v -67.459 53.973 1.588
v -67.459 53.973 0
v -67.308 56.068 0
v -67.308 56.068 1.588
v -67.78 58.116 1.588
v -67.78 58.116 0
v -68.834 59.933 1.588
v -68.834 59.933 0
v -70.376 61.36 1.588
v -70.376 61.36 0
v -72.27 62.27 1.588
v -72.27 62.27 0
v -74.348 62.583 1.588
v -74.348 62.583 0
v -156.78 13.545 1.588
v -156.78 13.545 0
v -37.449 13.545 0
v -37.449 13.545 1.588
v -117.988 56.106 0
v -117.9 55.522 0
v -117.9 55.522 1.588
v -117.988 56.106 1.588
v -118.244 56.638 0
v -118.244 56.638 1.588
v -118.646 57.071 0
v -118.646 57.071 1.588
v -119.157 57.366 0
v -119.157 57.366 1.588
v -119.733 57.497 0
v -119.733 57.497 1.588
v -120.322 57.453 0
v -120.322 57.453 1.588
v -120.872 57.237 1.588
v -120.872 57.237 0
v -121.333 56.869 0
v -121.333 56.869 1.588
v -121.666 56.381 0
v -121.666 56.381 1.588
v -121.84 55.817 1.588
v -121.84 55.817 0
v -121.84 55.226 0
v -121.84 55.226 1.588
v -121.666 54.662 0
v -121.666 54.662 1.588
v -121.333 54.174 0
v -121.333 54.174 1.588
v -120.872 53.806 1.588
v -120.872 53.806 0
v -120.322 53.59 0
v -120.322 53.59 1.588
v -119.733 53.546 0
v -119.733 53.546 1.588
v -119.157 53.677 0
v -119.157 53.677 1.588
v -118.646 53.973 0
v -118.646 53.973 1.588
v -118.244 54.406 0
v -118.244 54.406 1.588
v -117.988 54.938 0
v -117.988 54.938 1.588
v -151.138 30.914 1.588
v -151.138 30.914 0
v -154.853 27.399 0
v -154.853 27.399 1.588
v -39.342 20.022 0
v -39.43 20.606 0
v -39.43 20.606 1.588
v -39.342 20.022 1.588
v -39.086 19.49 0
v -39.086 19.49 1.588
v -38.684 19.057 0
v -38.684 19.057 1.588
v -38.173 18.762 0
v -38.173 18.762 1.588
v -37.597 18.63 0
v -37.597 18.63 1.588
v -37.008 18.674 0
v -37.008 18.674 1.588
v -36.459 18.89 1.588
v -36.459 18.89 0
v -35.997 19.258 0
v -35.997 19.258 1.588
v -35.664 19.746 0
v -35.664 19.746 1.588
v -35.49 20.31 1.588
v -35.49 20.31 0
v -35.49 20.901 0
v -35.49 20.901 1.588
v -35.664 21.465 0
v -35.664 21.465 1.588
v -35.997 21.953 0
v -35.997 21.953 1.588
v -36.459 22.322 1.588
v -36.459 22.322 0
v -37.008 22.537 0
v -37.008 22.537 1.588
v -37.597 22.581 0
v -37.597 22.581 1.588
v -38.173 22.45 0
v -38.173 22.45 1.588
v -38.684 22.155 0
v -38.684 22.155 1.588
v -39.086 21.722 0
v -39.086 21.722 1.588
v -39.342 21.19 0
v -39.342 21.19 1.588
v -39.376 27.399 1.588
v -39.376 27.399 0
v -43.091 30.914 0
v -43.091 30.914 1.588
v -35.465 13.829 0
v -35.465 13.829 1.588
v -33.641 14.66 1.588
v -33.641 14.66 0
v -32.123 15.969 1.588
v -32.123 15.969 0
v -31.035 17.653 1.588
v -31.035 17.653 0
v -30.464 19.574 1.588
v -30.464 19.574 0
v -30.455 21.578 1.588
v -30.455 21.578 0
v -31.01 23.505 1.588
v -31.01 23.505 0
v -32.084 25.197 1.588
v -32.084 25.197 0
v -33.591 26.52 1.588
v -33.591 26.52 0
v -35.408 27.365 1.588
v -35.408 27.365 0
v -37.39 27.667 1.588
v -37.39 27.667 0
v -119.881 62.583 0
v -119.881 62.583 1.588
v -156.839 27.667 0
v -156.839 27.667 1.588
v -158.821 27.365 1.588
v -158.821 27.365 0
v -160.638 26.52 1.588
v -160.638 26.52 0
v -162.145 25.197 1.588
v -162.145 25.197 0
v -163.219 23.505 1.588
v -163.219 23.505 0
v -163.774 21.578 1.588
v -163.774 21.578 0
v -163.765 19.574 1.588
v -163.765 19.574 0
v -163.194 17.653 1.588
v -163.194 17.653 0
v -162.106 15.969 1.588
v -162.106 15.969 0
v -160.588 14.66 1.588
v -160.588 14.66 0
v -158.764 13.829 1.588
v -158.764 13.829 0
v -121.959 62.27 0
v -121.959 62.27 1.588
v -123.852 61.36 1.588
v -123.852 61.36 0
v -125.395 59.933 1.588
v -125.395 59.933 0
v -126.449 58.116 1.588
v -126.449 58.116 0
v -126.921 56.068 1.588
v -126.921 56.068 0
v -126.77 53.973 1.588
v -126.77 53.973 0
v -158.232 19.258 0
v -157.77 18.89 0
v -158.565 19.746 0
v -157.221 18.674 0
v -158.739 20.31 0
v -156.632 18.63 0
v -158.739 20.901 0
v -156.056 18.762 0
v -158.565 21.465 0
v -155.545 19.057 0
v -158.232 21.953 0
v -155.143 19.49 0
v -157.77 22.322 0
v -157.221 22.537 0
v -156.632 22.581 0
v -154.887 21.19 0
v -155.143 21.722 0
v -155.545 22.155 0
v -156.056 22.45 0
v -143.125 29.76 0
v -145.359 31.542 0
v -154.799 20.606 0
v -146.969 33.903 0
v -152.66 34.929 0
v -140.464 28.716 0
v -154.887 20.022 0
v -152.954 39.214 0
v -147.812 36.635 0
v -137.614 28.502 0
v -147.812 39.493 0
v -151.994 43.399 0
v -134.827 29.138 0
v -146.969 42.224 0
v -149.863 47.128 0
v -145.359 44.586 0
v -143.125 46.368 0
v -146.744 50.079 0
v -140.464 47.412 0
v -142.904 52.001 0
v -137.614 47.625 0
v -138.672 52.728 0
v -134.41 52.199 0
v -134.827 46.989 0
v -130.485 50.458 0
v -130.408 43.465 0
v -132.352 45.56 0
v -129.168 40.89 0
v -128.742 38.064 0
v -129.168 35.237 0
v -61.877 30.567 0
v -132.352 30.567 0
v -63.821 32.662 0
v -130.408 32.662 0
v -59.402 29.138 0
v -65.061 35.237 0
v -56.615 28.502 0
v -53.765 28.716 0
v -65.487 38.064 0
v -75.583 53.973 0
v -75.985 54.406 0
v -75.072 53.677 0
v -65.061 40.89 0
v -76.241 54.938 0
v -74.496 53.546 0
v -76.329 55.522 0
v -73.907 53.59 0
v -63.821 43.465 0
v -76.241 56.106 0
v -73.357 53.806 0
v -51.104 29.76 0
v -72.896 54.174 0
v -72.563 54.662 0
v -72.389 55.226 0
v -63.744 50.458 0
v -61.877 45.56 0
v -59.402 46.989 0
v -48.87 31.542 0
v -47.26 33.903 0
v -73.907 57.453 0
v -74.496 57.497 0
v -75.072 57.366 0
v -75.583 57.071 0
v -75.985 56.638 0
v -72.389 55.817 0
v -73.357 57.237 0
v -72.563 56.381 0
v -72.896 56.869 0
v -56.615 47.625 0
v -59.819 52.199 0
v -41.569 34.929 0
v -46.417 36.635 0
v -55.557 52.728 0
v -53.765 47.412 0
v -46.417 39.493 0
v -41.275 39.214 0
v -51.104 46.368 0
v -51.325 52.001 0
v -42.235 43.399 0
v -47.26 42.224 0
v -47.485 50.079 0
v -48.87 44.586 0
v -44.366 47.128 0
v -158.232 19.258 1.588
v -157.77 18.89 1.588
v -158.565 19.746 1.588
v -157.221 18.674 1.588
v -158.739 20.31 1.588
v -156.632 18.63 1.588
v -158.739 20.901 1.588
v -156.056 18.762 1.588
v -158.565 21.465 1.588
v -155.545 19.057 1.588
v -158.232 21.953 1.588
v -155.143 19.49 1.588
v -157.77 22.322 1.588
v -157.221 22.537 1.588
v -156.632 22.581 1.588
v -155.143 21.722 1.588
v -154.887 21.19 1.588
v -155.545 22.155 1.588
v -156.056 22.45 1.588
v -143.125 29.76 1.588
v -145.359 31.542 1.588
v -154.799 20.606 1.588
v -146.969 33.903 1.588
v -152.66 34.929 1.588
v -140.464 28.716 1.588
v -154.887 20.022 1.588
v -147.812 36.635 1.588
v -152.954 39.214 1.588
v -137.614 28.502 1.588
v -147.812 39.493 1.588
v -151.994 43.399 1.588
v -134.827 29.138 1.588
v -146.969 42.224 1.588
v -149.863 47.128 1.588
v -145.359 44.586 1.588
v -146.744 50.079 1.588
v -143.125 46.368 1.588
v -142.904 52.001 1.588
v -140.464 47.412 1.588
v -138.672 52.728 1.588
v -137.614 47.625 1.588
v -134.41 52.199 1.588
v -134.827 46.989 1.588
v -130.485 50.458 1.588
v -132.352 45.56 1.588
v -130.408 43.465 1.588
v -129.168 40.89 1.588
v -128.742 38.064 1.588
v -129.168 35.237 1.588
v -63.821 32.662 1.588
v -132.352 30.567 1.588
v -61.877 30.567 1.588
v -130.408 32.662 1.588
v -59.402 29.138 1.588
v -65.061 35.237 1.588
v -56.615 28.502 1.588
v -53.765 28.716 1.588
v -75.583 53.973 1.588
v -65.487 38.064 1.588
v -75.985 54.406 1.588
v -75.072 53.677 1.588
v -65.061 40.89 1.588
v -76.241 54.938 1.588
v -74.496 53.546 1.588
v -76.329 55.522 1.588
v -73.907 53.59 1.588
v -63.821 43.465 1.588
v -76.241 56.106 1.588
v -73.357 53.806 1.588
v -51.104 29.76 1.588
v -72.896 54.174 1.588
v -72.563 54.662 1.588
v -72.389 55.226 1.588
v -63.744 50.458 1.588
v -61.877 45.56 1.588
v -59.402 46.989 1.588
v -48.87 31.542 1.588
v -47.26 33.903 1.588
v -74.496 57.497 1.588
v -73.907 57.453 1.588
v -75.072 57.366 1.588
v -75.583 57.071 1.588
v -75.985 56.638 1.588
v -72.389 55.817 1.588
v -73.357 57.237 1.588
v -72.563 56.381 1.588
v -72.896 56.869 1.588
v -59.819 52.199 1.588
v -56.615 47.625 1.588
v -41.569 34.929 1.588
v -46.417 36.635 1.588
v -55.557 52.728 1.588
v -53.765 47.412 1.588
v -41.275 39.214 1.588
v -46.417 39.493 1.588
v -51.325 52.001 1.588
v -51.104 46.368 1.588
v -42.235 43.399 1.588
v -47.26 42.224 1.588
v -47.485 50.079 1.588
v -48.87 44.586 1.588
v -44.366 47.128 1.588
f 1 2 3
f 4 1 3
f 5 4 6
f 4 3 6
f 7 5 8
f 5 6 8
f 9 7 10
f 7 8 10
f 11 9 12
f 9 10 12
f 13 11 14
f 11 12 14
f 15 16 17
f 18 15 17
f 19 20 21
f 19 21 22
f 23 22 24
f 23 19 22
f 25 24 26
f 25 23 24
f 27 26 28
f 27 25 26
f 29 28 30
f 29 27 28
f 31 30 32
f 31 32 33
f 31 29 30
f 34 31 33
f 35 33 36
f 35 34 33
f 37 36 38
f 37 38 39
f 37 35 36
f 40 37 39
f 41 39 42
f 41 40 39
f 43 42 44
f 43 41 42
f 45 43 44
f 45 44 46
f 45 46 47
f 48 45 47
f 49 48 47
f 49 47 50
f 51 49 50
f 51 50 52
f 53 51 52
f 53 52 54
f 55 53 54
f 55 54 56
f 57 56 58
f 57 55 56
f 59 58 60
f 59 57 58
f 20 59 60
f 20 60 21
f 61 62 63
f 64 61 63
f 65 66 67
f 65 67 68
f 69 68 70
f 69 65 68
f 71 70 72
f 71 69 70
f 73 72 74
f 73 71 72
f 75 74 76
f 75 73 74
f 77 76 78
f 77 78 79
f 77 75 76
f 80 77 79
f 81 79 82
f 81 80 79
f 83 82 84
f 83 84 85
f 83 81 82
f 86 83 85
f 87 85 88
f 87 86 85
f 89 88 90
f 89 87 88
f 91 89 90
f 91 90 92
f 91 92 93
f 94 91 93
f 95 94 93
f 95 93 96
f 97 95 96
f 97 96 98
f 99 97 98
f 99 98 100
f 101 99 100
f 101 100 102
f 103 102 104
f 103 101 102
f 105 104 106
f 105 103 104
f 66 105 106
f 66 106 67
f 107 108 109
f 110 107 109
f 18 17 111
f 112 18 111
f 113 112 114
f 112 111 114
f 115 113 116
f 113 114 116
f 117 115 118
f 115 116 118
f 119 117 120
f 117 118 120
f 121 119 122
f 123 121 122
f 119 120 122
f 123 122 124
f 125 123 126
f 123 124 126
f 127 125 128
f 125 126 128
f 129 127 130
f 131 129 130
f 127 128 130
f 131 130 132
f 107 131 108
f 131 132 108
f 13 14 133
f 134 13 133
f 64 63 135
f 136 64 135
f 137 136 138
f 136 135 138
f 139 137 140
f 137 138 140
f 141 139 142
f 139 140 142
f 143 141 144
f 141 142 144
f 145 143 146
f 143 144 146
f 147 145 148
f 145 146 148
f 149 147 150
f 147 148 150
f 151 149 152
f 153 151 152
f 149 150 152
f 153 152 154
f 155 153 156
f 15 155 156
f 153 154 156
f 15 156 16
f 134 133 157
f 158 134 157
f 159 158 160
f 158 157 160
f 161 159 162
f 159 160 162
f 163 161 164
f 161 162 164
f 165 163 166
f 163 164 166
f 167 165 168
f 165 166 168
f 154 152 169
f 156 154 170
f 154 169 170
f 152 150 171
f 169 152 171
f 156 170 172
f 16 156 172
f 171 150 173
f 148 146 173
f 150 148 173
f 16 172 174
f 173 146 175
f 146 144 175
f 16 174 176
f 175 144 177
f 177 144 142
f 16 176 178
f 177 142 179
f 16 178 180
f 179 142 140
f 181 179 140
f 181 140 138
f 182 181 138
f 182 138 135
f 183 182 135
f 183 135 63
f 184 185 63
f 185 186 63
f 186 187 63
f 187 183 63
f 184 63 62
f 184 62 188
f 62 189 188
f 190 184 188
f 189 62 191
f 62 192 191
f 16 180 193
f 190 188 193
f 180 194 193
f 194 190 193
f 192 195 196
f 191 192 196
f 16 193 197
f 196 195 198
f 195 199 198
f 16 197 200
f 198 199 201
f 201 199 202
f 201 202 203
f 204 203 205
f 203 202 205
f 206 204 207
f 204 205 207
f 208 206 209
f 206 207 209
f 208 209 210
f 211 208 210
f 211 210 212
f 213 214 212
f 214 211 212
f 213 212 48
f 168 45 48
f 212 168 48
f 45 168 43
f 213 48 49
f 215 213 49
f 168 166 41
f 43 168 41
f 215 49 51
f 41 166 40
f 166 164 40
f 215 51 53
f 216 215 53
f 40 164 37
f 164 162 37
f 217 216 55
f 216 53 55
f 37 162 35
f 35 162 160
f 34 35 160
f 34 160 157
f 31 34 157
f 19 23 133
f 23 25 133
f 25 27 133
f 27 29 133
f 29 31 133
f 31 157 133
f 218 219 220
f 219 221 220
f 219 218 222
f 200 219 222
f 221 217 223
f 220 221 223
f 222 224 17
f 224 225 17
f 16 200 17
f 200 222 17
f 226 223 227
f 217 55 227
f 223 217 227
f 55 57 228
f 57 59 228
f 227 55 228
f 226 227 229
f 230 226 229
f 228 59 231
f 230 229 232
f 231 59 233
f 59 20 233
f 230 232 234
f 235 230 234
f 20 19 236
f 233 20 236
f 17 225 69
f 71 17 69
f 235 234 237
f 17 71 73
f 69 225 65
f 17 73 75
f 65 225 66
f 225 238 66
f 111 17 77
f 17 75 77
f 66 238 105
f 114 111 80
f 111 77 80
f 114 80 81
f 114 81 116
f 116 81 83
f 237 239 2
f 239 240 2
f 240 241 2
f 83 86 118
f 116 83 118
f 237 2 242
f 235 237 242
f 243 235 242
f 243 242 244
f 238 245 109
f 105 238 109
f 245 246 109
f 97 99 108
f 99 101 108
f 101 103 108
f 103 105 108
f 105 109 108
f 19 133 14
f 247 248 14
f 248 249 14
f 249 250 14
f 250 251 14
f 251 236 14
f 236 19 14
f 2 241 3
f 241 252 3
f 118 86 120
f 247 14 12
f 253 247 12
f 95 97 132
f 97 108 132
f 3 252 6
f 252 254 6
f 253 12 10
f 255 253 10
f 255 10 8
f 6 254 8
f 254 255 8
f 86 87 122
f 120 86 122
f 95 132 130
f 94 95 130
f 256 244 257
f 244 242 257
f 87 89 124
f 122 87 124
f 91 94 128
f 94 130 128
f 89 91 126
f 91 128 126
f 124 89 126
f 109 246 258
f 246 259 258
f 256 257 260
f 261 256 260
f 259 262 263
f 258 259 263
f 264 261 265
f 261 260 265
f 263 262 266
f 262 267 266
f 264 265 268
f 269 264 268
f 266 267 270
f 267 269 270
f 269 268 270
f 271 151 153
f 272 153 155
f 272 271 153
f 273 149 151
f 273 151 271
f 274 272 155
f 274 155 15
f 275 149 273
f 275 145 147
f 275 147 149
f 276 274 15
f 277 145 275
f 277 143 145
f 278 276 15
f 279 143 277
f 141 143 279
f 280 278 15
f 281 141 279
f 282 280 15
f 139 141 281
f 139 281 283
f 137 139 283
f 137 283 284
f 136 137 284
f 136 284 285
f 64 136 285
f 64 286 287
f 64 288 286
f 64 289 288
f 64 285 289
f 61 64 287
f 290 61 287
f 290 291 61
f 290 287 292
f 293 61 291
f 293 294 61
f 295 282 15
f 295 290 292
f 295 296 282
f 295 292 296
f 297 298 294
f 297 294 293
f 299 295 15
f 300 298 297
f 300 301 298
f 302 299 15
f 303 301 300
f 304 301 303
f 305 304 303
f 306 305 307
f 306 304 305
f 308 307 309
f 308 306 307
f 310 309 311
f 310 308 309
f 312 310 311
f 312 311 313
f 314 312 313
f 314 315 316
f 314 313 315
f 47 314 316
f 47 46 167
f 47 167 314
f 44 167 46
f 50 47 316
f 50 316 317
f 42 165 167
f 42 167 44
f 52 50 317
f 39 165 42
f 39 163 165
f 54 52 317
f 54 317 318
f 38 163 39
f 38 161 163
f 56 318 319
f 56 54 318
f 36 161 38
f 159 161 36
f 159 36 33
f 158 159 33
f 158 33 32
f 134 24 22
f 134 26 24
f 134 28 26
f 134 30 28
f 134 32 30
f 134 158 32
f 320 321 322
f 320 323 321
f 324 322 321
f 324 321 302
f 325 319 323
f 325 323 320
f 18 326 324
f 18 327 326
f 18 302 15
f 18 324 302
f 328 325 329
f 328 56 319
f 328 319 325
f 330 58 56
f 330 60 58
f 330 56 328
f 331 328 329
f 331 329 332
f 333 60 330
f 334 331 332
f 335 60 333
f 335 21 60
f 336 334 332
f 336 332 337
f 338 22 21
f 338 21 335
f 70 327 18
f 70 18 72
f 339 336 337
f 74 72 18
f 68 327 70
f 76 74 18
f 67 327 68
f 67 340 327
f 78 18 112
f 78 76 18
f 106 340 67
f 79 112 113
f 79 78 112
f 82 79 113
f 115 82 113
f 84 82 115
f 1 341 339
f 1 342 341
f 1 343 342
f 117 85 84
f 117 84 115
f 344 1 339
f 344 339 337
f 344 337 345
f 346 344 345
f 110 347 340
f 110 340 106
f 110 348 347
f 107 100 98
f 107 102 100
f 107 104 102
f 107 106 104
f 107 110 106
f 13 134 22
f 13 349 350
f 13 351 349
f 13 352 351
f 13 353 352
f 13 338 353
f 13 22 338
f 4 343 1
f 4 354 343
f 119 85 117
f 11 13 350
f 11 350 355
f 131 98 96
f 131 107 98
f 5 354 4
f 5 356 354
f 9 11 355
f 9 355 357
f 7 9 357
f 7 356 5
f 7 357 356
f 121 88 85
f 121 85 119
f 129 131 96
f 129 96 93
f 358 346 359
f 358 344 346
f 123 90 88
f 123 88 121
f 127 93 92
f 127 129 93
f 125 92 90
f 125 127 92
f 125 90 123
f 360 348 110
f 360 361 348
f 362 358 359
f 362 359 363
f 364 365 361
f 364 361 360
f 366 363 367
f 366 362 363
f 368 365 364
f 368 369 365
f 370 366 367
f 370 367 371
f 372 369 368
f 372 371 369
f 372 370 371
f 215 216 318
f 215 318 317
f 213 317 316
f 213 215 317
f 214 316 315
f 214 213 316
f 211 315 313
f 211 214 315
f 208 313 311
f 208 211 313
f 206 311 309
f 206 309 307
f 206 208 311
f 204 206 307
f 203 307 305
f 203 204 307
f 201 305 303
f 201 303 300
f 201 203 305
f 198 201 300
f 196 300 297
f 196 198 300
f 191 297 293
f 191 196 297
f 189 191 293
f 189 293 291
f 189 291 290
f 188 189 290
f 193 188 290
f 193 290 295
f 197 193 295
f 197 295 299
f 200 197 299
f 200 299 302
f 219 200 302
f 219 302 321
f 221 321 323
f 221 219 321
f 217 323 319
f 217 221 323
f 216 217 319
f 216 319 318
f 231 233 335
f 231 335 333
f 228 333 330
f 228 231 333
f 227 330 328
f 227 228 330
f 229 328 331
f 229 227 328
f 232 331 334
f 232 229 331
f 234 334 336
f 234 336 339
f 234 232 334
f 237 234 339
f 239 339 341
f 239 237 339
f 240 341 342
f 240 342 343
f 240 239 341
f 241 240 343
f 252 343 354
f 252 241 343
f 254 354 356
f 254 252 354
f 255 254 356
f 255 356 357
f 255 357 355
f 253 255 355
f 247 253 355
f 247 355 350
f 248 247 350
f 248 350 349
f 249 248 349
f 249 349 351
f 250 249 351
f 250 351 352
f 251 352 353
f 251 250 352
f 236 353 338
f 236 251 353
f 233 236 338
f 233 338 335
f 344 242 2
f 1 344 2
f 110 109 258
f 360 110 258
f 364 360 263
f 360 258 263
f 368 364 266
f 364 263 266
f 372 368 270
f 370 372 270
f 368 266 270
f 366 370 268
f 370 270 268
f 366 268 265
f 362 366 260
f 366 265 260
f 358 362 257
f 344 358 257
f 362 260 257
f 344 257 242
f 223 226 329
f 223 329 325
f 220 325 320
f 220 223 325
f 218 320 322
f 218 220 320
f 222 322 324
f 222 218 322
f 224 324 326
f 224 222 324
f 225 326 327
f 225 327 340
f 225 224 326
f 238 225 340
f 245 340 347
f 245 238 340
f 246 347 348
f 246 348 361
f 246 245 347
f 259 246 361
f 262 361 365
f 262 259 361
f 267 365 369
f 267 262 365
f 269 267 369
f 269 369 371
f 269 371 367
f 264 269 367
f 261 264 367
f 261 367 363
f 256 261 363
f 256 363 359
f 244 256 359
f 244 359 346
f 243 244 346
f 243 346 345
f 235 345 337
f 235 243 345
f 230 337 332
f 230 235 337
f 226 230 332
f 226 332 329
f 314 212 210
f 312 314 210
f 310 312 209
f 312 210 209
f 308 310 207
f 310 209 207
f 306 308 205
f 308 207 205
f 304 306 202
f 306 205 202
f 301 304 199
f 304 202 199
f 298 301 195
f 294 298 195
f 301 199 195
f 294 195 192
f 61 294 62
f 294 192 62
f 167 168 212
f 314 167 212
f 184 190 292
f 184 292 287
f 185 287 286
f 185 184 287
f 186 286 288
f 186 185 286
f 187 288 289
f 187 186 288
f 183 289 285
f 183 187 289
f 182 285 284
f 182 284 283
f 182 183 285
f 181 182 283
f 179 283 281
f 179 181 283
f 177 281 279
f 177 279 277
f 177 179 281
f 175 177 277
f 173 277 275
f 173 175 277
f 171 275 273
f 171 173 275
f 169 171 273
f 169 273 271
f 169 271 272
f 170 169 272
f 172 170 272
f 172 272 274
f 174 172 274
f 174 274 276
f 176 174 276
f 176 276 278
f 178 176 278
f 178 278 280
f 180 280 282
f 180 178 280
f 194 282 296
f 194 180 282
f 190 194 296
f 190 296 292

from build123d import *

# Parameters (mm, degrees)
SKETCH1_R           = 1.9812
SKETCH1_R_2         = 9.5885
BOSS_EXTRUDE1_DEPTH = 1.5875


with BuildPart() as part:
    # Sketch1 → Boss-Extrude1 (new body)
    with BuildSketch(Plane.XY):
        with BuildLine():
            Line((-156.779774808, 13.544563035), (-37.44917733, 13.544563035))
            ThreePointArc((-37.44917733, 13.544563035), (-30.455296249, 21.578477211), (-39.376058675, 27.398970946))
            Line((-39.376058675, 27.398970946), (-43.090572863, 30.913874067))
            ThreePointArc((-43.090572863, 30.913874067), (-45.816597783, 48.718236551), (-63.74425571, 50.457666506))
            Line((-63.74425571, 50.457666506), (-67.458769898, 53.972569627))
            ThreePointArc((-67.458769898, 53.972569627), (-68.834377223, 59.933132802), (-74.347952883, 62.582867186))
            Line((-74.347952883, 62.582867186), (-119.880999255, 62.582867186))
            ThreePointArc((-119.880999255, 62.582867186), (-125.394574915, 59.933132802), (-126.770182239, 53.972569627))
            Line((-126.770182239, 53.972569627), (-130.484696428, 50.457666506))
            ThreePointArc((-130.484696428, 50.457666506), (-148.412354355, 48.718236551), (-151.138379275, 30.913874067))
            Line((-151.138379275, 30.913874067), (-154.852893463, 27.398970946))
            ThreePointArc((-154.852893463, 27.398970946), (-163.773655888, 21.578477211), (-156.779774808, 13.544563035))
        make_face()
        with Locations(Location((-37.44917733, 20.605763035, 0), (0, 0, 180))):
            Circle(SKETCH1_R, mode=Mode.SUBTRACT)
        with Locations((-138.330387031, 38.06371511)):
            Circle(SKETCH1_R_2, mode=Mode.SUBTRACT)
        with Locations((-119.880999255, 55.521667186)):
            Circle(SKETCH1_R, mode=Mode.SUBTRACT)
        with Locations((-156.779774808, 20.605763035)):
            Circle(SKETCH1_R, mode=Mode.SUBTRACT)
        with Locations(Location((-74.347952883, 55.521667186, 0), (0, 0, 180))):
            Circle(SKETCH1_R, mode=Mode.SUBTRACT)
        with Locations(Location((-55.898565106, 38.06371511, 0), (0, 0, 180))):
            Circle(SKETCH1_R_2, mode=Mode.SUBTRACT)
    extrude(amount=BOSS_EXTRUDE1_DEPTH)


solid = part.part
